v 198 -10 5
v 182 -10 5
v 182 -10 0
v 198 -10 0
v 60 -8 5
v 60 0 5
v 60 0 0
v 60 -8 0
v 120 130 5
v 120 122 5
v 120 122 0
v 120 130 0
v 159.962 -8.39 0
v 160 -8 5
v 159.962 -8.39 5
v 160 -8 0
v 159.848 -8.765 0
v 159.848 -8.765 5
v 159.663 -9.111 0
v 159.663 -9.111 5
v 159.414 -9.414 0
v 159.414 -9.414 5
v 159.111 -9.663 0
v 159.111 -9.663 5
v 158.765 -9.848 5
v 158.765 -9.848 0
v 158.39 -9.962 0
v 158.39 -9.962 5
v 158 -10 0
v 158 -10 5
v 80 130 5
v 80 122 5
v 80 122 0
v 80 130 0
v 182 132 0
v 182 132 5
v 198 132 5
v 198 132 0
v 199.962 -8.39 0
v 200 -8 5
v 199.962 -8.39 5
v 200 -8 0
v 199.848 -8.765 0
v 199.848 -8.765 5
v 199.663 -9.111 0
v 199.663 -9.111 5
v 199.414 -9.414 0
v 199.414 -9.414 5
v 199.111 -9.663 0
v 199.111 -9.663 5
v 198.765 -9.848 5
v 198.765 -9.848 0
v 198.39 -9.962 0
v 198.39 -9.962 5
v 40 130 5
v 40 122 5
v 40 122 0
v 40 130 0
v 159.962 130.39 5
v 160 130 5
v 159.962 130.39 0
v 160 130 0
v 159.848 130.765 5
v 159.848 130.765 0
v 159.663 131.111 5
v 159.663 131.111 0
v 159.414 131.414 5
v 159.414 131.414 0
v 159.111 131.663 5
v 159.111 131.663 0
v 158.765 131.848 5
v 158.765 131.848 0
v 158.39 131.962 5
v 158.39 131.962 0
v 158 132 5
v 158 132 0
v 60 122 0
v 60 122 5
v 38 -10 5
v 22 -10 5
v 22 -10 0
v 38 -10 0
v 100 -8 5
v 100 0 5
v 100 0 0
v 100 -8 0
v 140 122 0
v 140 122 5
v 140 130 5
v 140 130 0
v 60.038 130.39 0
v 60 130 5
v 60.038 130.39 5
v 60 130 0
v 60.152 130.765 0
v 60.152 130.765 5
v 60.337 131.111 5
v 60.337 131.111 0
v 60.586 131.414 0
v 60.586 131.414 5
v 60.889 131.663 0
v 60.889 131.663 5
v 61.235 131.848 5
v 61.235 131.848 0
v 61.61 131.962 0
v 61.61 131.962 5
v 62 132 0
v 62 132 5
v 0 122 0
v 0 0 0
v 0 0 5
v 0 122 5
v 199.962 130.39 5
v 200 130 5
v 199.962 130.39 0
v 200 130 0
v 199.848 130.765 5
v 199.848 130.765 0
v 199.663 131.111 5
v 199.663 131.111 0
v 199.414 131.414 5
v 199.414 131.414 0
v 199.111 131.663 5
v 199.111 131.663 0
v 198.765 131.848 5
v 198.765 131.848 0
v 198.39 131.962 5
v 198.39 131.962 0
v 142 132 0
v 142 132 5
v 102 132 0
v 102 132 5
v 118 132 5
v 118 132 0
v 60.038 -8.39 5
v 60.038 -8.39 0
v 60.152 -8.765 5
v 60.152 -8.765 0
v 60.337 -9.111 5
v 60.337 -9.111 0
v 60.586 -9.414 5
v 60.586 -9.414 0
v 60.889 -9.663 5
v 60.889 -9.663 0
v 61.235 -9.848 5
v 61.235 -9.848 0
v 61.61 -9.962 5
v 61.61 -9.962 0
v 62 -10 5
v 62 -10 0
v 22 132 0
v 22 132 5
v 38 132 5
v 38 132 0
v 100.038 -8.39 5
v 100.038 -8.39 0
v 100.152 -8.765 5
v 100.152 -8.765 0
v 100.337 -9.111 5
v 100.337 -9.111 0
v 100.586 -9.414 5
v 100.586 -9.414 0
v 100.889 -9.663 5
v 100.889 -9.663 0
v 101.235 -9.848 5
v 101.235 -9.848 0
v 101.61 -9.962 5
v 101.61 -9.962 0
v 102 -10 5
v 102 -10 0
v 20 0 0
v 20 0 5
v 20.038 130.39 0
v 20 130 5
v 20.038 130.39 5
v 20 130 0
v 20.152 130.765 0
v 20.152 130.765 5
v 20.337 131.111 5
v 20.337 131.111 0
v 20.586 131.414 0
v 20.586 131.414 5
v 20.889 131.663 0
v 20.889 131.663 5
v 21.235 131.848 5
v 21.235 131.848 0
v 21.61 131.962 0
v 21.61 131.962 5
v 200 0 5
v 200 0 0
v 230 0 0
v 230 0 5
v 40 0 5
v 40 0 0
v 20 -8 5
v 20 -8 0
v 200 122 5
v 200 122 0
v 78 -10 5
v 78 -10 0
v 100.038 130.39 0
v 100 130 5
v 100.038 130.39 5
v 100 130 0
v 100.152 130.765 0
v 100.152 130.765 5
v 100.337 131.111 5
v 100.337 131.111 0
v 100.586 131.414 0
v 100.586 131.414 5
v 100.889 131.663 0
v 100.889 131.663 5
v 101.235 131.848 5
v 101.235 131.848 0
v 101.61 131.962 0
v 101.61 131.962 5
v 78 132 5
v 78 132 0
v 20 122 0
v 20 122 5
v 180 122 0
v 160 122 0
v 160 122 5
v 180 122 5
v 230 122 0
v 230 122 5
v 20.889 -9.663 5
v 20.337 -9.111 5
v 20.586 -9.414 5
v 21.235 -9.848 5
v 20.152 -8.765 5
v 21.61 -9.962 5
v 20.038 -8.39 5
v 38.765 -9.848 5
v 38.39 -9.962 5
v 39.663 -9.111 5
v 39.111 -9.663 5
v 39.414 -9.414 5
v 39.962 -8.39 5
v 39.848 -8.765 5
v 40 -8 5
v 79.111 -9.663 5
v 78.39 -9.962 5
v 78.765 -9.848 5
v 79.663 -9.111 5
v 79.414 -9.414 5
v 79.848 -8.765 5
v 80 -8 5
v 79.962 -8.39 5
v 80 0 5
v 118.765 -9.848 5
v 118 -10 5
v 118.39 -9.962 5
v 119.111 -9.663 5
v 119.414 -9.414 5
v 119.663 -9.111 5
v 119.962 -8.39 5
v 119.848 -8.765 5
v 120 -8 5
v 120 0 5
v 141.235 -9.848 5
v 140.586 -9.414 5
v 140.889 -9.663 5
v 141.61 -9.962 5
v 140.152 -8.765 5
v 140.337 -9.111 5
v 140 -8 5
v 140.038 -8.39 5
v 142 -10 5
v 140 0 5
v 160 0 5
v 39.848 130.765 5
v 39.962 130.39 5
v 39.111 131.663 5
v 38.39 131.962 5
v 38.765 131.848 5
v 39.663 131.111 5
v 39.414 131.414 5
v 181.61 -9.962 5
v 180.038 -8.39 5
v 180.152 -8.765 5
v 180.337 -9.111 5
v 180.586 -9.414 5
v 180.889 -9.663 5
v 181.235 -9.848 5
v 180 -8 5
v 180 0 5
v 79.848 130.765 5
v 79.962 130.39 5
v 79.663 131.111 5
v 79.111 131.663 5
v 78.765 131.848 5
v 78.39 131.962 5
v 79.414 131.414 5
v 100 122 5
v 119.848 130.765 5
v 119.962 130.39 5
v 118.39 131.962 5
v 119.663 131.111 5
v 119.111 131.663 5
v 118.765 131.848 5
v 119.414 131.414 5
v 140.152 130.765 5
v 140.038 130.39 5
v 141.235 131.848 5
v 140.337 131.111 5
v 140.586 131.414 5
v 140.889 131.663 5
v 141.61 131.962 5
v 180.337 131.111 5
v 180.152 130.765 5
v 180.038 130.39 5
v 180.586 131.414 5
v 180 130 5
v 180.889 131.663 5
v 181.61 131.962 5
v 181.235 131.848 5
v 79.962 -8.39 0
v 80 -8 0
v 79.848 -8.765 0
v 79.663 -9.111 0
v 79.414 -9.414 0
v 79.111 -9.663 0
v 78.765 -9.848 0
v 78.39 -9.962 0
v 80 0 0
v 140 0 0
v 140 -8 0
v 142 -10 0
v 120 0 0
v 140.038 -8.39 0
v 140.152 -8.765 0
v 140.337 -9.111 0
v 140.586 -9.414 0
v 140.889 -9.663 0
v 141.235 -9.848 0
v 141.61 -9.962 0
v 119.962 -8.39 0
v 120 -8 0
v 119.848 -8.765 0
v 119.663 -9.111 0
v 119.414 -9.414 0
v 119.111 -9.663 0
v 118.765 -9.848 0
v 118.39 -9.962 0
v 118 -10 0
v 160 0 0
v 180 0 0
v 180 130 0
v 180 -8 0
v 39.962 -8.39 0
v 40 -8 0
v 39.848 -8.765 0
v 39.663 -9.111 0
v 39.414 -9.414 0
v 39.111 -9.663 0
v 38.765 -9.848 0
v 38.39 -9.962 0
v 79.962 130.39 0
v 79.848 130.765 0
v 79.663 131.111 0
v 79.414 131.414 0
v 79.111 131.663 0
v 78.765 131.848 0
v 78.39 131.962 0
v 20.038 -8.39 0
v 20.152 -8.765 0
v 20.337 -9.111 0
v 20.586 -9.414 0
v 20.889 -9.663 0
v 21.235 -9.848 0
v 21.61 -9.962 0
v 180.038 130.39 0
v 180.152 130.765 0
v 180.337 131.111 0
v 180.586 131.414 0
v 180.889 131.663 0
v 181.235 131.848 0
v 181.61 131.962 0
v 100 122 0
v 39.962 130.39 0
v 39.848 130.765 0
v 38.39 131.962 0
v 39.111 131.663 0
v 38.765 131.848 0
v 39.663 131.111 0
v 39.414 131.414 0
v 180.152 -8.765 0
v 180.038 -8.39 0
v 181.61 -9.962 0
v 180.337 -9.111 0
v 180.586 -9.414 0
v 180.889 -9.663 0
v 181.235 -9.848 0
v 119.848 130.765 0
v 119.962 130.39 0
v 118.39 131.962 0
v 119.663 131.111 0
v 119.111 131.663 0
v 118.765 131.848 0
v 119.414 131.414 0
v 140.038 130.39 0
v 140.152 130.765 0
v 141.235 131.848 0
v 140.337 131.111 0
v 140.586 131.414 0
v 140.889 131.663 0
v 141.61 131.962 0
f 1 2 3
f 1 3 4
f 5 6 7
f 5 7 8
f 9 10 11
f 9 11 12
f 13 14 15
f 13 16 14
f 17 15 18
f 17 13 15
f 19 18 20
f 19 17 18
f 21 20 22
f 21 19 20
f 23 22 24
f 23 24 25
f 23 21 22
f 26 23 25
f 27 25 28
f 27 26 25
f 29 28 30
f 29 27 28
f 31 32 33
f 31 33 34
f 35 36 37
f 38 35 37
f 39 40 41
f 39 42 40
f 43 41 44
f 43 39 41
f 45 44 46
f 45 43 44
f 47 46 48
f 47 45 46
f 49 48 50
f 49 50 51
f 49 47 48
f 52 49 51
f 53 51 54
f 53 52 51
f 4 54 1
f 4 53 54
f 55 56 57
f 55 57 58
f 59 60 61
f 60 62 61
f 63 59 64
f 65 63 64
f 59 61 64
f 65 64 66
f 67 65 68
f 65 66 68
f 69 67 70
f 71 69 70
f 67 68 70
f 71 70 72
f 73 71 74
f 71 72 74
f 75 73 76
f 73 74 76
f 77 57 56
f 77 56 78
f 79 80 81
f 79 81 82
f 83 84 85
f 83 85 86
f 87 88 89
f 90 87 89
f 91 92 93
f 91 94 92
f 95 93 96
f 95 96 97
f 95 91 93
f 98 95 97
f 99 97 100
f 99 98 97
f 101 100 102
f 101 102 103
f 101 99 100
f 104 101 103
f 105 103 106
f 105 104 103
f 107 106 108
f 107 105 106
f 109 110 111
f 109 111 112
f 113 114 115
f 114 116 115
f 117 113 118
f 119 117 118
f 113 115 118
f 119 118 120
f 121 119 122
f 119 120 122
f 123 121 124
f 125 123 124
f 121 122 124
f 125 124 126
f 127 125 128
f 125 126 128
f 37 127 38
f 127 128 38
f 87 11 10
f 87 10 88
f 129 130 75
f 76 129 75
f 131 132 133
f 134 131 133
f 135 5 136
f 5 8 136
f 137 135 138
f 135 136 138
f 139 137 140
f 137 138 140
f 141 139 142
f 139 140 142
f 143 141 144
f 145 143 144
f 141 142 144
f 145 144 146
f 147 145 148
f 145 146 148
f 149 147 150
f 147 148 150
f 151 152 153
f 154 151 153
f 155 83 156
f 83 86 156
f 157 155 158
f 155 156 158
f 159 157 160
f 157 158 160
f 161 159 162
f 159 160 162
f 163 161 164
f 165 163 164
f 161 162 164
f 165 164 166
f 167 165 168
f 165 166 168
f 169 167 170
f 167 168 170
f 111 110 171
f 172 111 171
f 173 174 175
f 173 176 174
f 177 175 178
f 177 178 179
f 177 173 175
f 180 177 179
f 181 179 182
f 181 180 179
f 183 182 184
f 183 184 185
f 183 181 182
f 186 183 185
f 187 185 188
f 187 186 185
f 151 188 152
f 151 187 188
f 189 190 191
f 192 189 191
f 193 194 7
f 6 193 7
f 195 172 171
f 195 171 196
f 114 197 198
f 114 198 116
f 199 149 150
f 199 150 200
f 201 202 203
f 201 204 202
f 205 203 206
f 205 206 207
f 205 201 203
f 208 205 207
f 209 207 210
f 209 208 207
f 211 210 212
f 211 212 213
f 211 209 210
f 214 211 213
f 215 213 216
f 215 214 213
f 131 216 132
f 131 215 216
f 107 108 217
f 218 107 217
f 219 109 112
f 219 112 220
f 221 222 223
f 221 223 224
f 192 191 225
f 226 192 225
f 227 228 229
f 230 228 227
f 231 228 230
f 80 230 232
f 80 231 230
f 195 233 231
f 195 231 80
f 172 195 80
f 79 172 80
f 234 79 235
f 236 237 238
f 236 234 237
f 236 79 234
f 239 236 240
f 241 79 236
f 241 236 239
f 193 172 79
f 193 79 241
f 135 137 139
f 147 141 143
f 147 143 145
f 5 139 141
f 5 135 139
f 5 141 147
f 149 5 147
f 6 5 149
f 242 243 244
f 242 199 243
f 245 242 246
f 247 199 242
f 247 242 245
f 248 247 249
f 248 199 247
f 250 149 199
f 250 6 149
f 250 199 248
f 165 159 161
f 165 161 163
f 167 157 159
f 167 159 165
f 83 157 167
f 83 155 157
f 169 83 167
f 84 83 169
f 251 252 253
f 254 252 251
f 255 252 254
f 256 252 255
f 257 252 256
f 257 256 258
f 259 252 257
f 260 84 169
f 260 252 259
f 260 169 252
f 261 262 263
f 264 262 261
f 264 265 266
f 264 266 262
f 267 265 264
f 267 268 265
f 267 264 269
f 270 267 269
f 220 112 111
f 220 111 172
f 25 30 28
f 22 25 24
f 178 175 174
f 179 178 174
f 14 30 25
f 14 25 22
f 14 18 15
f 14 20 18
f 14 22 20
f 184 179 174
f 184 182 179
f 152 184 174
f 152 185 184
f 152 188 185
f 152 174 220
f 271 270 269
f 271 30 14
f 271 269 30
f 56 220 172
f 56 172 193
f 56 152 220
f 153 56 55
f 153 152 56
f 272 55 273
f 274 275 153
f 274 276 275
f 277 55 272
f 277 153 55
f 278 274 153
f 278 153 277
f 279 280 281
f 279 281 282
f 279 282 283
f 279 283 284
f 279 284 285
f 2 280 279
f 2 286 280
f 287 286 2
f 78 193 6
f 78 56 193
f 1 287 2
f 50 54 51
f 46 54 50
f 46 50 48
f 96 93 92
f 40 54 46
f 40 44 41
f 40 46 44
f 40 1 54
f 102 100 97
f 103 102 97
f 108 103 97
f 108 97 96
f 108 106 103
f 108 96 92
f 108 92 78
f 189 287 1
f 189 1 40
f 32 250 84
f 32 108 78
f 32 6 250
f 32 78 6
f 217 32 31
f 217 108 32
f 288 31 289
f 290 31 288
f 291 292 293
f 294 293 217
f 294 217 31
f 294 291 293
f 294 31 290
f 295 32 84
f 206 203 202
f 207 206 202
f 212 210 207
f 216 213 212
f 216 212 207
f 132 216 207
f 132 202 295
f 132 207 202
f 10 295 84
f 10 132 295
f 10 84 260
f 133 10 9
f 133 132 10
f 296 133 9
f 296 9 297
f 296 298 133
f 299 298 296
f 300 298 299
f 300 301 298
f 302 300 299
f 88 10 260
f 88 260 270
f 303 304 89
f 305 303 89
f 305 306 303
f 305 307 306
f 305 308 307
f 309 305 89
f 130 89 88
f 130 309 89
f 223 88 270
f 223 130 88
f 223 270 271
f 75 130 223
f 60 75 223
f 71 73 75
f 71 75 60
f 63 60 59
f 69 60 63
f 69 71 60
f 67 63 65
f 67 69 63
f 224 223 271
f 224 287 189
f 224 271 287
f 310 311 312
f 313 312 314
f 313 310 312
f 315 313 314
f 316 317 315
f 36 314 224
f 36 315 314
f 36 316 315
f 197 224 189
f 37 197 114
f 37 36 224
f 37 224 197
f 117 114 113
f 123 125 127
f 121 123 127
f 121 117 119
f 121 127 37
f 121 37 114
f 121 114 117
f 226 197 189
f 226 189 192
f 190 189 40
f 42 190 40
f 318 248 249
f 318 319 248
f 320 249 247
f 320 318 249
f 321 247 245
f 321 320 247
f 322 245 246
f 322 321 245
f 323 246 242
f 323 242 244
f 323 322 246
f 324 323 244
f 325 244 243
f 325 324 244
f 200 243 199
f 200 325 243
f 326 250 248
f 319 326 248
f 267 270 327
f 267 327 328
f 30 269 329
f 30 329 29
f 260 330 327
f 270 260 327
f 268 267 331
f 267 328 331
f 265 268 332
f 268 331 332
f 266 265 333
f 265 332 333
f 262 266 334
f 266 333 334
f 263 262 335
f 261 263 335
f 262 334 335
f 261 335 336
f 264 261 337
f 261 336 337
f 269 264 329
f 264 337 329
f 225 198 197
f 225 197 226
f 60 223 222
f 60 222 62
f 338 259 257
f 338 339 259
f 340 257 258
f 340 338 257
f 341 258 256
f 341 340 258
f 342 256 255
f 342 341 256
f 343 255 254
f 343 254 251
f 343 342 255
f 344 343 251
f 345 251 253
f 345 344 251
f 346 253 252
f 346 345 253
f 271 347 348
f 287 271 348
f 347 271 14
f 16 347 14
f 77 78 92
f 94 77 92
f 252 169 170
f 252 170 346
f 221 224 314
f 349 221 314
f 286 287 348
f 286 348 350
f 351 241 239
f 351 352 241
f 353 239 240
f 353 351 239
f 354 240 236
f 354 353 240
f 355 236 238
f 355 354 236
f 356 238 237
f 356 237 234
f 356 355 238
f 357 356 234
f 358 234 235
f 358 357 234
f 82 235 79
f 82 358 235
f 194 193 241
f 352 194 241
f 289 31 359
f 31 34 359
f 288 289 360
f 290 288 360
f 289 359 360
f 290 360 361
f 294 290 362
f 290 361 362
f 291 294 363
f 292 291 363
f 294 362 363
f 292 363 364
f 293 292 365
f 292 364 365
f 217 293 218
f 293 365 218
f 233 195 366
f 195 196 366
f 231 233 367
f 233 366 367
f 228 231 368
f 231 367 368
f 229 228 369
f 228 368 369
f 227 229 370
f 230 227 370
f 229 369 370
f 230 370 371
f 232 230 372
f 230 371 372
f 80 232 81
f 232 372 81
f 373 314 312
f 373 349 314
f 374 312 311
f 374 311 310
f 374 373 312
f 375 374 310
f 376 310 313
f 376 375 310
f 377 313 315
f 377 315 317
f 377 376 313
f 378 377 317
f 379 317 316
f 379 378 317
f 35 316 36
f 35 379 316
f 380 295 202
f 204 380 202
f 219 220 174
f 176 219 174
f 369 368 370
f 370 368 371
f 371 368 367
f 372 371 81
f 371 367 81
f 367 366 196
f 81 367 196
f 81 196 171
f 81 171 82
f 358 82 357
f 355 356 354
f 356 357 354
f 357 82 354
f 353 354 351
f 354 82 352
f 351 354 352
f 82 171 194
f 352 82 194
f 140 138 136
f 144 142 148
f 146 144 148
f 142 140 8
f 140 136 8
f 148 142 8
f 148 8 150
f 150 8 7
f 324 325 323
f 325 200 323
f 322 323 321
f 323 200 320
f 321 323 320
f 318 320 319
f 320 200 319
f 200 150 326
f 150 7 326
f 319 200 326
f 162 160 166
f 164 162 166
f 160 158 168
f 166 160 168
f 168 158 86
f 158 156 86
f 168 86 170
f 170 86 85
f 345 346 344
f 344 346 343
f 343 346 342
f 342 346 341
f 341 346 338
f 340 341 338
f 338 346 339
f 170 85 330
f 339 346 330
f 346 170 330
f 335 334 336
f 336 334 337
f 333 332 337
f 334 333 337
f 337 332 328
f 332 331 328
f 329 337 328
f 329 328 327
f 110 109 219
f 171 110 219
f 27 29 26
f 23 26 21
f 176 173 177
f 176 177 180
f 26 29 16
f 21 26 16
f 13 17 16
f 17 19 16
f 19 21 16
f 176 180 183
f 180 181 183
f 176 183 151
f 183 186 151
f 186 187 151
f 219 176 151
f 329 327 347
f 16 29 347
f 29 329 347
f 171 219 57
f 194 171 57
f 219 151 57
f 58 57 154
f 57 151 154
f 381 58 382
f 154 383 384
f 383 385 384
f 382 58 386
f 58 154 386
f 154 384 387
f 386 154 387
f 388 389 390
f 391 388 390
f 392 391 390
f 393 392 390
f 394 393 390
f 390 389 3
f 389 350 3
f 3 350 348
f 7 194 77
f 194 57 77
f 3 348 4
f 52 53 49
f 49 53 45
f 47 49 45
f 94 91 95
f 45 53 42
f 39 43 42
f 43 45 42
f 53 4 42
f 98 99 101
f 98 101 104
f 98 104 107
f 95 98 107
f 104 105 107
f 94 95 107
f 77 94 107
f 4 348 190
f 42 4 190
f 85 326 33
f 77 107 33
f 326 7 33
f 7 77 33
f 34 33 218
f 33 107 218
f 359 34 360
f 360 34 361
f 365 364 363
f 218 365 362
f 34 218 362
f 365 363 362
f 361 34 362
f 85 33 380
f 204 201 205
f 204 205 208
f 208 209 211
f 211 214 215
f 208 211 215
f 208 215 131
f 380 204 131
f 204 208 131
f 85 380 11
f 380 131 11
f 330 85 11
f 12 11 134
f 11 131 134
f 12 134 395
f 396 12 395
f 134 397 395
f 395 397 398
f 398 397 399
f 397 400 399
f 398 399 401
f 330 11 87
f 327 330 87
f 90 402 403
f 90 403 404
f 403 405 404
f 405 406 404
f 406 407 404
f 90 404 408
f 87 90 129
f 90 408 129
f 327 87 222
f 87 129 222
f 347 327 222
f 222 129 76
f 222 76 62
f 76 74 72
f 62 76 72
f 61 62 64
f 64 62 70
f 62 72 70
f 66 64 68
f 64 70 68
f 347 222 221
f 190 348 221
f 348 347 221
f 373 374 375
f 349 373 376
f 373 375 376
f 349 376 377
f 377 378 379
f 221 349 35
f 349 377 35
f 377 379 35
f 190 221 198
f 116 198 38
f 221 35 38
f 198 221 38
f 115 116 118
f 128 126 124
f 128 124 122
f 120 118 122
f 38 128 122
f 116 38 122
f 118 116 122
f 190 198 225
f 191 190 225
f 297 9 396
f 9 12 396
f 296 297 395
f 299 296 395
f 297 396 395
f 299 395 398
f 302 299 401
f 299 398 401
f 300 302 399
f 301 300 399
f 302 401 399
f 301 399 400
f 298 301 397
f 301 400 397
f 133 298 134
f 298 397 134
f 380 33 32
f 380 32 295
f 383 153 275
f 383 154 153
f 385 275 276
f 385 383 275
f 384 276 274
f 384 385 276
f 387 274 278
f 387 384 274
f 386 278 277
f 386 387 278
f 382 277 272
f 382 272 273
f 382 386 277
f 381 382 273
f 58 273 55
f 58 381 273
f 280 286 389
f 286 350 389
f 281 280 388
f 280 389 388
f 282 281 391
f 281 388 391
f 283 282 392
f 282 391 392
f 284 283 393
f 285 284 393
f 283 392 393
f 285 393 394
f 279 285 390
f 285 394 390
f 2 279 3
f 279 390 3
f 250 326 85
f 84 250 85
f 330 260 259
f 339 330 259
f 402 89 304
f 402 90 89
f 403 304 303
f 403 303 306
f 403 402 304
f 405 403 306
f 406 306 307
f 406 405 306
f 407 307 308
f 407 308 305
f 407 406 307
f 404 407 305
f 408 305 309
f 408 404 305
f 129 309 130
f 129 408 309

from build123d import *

# Parameters (mm, degrees)
SKETCH1_W            = 230
SKETCH1_H            = 122
BOSS_EXTRUDE1_DEPTH  = 5
SKETCH2_W            = 20
SKETCH2_H            = 10
BOSS_EXTRUDE2_DEPTH  = 5
FILLET1_R            = 2
FILLET1_OF_MIRROR1_R = 2


with BuildPart() as part:
    # Sketch1 → Boss-Extrude1 (new body)
    with BuildSketch(Plane.XY):
        with Locations((115, 61)):
            Rectangle(SKETCH1_W, SKETCH1_H)
    extrude(amount=BOSS_EXTRUDE1_DEPTH)

    # Sketch2 → Boss-Extrude2 (add)
    with BuildSketch(Plane.XY.offset(5)):
        with Locations((30, 127)):
            Rectangle(SKETCH2_W, SKETCH2_H)
        with Locations((70, 127)):
            Rectangle(SKETCH2_W, SKETCH2_H)
        with Locations((110, 127)):
            Rectangle(SKETCH2_W, SKETCH2_H)
        with Locations((150, 127)):
            Rectangle(SKETCH2_W, SKETCH2_H)
        with Locations((190, 127)):
            Rectangle(SKETCH2_W, SKETCH2_H)
    boss_extrude2 = extrude(amount=-BOSS_EXTRUDE2_DEPTH)

    # Fillet1
    fillet1_edges = [part.edges().sort_by_distance(p)[0] for p in [
        (40, 132, 2.5),
        (20, 132, 2.5),
        (80, 132, 2.5),
        (60, 132, 2.5),
        (120, 132, 2.5),
        (100, 132, 2.5),
        (160, 132, 2.5),
        (140, 132, 2.5),
        (200, 132, 2.5),
        (180, 132, 2.5),
    ]]
    fillet(fillet1_edges, radius=FILLET1_R)

    # Mirror1: Boss-Extrude2 across plane
    add(boss_extrude2.mirror(Plane.ZX.offset(61)))

    # Fillet1 of Mirror1
    fillet1_of_mirror1_edges = [part.edges().sort_by_distance(p)[0] for p in [
        (40, -10, 2.5),
        (20, -10, 2.5),
        (80, -10, 2.5),
        (60, -10, 2.5),
        (120, -10, 2.5),
        (100, -10, 2.5),
        (160, -10, 2.5),
        (140, -10, 2.5),
        (200, -10, 2.5),
        (180, -10, 2.5),
    ]]
    fillet(fillet1_of_mirror1_edges, radius=FILLET1_OF_MIRROR1_R)


solid = part.part
